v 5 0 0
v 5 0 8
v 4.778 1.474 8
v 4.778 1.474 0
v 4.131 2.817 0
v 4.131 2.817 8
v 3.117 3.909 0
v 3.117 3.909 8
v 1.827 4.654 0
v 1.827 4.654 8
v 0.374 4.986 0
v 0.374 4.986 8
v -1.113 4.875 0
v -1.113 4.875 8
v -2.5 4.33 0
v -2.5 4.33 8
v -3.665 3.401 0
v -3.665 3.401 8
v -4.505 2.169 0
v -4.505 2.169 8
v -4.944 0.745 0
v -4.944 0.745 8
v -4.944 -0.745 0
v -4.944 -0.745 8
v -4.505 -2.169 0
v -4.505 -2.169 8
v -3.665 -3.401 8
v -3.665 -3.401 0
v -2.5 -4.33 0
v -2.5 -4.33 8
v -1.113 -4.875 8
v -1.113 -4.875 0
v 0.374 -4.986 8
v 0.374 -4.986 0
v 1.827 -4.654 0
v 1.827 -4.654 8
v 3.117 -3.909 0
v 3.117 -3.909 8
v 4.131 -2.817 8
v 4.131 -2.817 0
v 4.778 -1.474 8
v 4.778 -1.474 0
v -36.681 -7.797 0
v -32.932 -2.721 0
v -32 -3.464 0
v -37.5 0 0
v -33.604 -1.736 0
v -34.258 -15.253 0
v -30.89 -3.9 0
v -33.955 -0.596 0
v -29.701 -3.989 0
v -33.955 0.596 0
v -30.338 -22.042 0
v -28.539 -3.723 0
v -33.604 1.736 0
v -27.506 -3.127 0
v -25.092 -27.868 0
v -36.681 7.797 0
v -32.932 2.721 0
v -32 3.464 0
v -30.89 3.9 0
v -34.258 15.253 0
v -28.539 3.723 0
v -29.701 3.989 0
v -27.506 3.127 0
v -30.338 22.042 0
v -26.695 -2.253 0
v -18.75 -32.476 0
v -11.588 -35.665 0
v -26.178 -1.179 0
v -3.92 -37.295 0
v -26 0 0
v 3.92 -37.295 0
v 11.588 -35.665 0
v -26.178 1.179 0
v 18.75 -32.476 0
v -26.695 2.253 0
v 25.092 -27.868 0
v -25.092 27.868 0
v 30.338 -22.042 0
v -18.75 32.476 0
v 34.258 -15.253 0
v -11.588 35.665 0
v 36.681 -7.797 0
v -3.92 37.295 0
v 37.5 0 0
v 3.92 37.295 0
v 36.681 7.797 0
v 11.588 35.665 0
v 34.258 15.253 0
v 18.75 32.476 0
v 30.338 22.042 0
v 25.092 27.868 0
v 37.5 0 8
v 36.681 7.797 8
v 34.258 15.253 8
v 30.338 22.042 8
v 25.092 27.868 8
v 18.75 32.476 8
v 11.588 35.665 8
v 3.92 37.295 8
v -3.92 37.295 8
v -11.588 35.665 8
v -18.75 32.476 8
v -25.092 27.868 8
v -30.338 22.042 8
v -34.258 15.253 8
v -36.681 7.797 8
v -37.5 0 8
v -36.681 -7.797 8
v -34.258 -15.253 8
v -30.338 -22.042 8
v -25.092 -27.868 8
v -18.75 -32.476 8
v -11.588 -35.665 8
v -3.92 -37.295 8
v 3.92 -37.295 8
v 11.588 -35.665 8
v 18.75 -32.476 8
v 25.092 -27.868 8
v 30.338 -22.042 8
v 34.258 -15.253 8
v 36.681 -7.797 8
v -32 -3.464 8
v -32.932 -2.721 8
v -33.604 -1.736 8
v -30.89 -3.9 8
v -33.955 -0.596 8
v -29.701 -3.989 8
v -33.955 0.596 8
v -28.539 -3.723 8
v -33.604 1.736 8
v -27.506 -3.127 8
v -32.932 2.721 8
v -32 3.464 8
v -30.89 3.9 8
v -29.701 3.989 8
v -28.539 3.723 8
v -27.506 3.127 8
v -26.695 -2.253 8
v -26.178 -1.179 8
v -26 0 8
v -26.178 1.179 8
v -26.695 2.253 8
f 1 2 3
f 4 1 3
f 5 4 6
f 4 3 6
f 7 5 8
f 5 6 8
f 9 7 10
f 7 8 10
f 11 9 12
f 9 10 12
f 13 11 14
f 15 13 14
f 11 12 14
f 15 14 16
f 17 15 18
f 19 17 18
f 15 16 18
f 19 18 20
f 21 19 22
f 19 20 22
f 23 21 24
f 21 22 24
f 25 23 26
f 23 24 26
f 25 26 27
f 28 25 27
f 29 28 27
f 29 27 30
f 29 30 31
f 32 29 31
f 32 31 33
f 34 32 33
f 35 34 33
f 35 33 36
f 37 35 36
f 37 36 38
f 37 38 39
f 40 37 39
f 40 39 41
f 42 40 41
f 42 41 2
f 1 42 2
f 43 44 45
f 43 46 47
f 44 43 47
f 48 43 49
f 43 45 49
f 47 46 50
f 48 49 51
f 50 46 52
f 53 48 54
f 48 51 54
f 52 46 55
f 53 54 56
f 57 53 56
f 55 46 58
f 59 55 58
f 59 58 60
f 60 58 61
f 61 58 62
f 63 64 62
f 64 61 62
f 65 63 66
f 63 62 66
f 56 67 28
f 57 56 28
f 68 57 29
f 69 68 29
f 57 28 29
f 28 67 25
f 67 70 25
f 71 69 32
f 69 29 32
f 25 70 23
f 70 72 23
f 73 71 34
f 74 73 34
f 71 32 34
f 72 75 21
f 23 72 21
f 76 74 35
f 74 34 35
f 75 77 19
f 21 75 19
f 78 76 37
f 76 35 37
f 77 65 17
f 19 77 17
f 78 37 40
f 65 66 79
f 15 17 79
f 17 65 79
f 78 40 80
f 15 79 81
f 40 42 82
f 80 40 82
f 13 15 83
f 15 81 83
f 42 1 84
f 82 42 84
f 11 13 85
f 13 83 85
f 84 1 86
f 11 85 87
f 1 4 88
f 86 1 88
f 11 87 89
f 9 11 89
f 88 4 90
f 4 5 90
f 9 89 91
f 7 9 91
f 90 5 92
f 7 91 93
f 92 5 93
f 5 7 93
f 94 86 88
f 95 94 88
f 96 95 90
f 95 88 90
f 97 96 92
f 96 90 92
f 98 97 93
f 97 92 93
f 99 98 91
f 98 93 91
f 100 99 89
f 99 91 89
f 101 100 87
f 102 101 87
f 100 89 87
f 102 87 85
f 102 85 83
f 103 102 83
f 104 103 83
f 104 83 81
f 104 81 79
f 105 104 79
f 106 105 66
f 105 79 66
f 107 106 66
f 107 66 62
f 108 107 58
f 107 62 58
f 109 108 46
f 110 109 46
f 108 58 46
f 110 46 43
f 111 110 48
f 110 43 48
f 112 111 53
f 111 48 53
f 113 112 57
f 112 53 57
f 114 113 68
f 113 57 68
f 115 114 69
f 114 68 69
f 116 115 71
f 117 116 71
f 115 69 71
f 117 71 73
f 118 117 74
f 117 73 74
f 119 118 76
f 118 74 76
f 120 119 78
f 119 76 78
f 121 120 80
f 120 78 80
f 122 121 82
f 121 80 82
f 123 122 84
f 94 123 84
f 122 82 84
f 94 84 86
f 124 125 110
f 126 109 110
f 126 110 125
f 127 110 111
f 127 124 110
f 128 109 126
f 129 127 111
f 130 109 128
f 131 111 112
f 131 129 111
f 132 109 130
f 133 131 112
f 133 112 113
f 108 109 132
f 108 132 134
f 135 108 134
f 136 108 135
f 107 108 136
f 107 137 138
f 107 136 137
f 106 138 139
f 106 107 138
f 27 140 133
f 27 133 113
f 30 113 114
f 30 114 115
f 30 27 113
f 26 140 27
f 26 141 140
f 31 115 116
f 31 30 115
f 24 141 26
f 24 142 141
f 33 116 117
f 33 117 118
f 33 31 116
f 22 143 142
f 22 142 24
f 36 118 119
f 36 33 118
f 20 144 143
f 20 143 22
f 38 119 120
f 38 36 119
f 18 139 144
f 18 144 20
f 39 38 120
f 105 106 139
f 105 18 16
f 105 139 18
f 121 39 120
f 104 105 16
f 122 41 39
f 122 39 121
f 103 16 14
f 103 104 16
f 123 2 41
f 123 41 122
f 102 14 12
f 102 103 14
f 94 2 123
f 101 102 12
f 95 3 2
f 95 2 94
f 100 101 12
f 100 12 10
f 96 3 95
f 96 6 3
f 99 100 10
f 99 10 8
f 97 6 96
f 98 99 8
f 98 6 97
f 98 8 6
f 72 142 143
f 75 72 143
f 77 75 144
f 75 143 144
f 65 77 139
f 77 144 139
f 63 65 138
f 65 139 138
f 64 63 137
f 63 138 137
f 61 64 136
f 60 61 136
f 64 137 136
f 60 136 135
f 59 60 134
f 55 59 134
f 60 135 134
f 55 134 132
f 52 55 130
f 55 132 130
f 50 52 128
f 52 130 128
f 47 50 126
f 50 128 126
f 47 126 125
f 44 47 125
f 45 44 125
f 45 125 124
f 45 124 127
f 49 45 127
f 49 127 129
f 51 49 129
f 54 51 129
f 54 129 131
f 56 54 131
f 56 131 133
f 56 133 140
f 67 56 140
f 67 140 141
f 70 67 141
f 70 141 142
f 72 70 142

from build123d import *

# Parameters (mm, degrees)
SKETCH_1_R          = 37.5
EXTRUDE_1_DEPTH     = 8
SKETCH_2_R          = 4
CUT_EXTRUDE_1_DEPTH = 13
SKETCH_3_R          = 5
CUT_EXTRUDE_2_DEPTH = 13


with BuildPart() as part:
    # 草图1 → 凸台-拉伸1 (new body)
    with BuildSketch(Plane.XY):
        Circle(SKETCH_1_R)
    extrude(amount=EXTRUDE_1_DEPTH)

    # 草图2 → 切除-拉伸1 (cut)
    with BuildSketch(Plane.XY.offset(8)):
        with Locations((-30, 0)):
            Circle(SKETCH_2_R)
    extrude(amount=-CUT_EXTRUDE_1_DEPTH, mode=Mode.SUBTRACT)

    # 草图3 → 切除-拉伸2 (cut)
    with BuildSketch(Plane.XY.offset(8)):
        Circle(SKETCH_3_R)
    extrude(amount=-CUT_EXTRUDE_2_DEPTH, mode=Mode.SUBTRACT)


solid = part.part
